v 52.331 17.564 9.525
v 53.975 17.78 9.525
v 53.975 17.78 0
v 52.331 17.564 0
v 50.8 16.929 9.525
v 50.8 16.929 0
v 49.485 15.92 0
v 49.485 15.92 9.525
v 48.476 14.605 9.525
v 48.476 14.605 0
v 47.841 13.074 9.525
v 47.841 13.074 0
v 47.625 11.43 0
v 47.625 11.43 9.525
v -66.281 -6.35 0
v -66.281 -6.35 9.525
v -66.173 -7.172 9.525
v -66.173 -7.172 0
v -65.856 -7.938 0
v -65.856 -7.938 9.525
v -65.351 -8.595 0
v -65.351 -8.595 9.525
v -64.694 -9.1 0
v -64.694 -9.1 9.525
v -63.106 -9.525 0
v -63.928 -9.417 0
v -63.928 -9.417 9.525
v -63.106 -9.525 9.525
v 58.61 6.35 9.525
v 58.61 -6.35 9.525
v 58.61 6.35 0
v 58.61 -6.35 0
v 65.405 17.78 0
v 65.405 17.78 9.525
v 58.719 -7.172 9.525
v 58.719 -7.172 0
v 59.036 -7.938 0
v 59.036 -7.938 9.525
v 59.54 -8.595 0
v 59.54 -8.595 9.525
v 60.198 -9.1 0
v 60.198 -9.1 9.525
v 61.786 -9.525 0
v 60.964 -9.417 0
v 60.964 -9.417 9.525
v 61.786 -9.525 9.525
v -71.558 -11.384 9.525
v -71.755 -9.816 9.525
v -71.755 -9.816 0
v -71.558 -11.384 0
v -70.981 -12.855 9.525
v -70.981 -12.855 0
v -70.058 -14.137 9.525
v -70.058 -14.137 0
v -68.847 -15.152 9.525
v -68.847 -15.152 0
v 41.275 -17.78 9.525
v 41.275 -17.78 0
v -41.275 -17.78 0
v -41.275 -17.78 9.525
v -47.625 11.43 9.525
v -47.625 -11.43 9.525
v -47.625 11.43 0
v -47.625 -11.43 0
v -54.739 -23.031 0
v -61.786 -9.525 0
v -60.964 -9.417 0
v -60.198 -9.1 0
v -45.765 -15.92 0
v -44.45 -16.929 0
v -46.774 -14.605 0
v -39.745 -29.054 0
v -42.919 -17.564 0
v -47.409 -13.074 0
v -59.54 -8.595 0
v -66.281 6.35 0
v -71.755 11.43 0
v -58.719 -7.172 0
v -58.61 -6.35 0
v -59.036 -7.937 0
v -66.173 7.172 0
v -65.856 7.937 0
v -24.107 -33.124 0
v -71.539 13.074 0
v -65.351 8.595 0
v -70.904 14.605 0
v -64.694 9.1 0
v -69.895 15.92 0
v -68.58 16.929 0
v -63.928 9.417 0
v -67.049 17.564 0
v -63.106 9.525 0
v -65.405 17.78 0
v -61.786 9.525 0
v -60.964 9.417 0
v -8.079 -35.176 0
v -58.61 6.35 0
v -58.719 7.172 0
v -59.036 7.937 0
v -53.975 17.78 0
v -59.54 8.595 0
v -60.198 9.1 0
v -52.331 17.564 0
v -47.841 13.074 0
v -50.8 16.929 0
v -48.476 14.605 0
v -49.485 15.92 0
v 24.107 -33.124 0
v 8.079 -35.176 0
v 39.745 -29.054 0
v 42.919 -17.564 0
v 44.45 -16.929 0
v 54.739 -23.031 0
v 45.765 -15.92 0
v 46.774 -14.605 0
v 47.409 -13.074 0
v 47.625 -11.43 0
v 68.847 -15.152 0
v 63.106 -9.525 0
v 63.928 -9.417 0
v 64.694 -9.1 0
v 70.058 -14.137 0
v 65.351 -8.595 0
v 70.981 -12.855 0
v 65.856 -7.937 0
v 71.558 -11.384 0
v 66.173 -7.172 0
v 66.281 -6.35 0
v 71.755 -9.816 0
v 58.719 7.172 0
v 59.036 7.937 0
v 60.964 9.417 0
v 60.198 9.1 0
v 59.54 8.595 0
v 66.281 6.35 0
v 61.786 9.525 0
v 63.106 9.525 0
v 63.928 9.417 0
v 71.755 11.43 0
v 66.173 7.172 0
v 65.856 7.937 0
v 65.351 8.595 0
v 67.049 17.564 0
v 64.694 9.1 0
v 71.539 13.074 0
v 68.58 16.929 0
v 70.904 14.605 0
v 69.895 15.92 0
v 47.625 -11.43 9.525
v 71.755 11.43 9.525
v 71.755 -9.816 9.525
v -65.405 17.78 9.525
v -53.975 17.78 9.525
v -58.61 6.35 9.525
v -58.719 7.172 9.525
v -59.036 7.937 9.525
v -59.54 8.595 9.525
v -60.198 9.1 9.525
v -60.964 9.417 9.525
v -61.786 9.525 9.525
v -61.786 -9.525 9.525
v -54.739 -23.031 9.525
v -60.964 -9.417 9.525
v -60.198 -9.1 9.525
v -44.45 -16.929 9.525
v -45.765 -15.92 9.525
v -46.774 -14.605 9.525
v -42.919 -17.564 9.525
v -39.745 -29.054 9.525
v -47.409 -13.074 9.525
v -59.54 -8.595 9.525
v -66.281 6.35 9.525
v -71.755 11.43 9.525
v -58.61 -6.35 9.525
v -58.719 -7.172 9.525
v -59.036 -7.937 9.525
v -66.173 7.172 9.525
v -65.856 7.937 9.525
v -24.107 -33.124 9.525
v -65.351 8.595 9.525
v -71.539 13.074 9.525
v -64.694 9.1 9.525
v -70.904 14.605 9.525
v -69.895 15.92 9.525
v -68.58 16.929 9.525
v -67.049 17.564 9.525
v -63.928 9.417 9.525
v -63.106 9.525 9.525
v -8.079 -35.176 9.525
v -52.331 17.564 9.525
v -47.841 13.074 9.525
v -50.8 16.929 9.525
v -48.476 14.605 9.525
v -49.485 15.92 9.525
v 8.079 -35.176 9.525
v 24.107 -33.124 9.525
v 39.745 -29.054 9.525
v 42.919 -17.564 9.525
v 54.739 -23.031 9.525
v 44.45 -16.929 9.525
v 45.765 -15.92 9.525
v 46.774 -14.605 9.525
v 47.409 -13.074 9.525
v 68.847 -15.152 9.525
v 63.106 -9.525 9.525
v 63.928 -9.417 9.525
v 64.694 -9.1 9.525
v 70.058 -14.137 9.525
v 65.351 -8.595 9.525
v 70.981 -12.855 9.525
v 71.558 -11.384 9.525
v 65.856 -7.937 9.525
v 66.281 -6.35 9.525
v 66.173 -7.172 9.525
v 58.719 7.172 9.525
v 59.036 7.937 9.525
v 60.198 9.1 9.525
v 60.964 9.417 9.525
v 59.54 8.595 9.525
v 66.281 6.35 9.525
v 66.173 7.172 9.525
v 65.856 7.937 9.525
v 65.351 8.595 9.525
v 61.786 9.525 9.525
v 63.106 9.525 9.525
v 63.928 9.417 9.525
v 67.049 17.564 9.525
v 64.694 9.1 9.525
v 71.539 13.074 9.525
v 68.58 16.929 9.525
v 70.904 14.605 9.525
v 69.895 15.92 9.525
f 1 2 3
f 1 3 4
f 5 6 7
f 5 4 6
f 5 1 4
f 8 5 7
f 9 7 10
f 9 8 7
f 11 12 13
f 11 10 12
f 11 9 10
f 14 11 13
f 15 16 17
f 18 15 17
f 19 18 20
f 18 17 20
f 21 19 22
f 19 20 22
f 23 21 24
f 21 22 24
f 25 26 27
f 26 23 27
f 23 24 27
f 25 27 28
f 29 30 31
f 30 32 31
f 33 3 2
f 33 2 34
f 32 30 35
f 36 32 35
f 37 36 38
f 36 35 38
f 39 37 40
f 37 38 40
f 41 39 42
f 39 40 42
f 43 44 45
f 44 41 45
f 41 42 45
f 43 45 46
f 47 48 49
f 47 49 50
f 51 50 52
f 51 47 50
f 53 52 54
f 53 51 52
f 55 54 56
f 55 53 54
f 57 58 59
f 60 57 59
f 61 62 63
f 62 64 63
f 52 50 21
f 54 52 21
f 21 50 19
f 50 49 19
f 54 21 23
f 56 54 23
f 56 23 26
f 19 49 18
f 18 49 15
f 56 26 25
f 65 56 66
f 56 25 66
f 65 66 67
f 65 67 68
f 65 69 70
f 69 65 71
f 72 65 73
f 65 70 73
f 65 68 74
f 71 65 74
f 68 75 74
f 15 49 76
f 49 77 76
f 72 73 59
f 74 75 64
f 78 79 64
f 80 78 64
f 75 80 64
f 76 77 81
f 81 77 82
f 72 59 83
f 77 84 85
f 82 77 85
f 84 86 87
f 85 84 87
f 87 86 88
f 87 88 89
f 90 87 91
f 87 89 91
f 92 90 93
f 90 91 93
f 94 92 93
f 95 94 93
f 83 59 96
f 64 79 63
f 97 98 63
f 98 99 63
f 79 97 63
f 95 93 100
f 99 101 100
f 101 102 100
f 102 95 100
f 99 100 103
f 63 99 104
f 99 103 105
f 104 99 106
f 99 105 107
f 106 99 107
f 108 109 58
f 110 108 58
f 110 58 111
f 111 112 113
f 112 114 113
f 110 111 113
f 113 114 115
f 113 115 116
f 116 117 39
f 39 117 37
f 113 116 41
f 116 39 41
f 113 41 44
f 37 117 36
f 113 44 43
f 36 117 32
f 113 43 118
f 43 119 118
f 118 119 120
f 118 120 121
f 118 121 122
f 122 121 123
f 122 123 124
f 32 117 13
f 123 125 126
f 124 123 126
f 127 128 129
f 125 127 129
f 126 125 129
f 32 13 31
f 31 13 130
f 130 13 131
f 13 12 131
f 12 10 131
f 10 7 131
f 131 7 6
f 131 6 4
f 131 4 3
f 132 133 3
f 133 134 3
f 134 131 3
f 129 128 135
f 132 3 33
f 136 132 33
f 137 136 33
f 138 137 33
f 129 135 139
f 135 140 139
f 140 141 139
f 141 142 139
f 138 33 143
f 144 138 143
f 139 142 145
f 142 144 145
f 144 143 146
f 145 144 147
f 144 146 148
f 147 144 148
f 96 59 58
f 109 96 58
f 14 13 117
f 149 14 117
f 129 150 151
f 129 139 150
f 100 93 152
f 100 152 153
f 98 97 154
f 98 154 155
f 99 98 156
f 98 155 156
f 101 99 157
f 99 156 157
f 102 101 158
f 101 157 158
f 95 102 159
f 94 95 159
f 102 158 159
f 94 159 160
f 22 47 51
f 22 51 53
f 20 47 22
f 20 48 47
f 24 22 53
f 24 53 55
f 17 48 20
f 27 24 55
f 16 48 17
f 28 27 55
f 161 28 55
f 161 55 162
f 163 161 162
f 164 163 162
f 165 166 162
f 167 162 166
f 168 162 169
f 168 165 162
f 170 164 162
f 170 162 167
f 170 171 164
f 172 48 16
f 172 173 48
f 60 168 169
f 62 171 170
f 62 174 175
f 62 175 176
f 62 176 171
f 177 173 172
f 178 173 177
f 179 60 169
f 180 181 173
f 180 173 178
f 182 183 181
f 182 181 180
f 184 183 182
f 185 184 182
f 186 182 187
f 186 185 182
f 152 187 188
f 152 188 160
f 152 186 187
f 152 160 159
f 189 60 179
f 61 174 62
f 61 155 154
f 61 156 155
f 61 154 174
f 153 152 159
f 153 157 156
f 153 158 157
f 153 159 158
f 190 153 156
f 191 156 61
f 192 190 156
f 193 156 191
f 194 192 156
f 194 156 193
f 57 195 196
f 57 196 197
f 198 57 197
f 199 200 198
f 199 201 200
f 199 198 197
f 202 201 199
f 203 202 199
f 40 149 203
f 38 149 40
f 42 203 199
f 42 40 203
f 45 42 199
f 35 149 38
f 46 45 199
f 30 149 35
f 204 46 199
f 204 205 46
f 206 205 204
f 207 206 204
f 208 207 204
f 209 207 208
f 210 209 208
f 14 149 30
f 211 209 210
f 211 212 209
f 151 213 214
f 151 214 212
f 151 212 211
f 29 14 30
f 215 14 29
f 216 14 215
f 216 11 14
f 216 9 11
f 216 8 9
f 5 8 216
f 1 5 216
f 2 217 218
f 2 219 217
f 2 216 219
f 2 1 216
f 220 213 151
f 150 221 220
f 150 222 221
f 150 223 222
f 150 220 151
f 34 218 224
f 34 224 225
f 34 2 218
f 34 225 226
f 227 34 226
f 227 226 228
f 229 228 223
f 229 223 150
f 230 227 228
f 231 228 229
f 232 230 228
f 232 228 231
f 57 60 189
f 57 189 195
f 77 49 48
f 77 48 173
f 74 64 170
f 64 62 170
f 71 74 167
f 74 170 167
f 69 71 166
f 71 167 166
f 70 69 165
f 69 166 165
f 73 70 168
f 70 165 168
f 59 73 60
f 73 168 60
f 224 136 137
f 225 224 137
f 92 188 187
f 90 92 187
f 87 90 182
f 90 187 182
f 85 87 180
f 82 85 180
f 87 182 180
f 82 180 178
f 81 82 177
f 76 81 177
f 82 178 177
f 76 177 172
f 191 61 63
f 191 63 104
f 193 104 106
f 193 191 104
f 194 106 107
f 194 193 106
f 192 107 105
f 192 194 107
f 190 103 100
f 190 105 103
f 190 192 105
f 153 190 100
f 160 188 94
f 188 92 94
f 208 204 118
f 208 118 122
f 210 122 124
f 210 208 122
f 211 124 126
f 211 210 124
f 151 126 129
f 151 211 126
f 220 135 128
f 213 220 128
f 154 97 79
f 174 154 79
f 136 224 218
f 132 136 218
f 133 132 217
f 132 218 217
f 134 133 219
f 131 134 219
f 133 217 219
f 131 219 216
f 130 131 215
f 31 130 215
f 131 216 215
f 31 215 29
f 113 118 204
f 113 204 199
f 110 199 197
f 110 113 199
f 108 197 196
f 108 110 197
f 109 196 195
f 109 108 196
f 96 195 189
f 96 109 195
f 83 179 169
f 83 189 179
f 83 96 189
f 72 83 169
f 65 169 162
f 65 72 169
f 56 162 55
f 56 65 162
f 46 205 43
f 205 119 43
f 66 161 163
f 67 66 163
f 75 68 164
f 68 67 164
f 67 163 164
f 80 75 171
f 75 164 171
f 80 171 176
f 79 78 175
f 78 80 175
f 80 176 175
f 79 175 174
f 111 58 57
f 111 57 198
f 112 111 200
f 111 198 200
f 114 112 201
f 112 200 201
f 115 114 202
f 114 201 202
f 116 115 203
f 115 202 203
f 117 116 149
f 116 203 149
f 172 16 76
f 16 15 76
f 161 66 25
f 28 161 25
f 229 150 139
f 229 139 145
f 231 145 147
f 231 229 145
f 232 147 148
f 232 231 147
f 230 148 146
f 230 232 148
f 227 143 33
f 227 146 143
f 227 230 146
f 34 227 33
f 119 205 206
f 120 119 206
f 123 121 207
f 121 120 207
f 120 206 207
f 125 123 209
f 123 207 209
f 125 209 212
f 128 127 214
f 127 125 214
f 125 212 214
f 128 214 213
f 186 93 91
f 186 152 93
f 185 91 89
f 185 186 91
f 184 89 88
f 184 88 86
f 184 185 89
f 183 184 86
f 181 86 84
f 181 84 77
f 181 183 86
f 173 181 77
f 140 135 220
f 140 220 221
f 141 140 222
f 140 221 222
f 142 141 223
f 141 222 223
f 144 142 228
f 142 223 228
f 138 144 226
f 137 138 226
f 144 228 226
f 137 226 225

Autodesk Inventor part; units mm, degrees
sketch "Sketch1" plane through (0, 0, 0) normal (0, 0, 1) x (1, 0, 0)
  line L0 (-100.457, 0) -> (100.457, 0) construction
  line L1 (0, 116.967) -> (0, -60.833) construction
  circle A0 centre (-62.4459, 0) radius 3.8354 construction
  circle A1 centre (62.4459, 0) radius 3.8354 construction
  line L2 (-62.4459, 0) -> (62.4459, 0) construction
  line L3 (-71.755, 17.78) -> (71.755, 17.78)
  line L4 (71.755, 17.78) -> (71.755, -13.2195)
  line L5 (-71.755, -13.2195) -> (-71.755, 17.78)
  circle A2 centre (-64.3509, 0) radius 3.8354 construction
  circle A3 centre (-60.5409, 0) radius 3.8354 construction
  line L6 (-64.3559, 3.8354) -> (-60.5409, 3.8354) construction
  line L7 (-64.3763, -3.8353) -> (-60.541, -3.8354) construction
  circle A4 centre (62.4459, 0) radius 3.8354 construction
  arc A5 (-71.755, -13.2195) -> (71.755, -13.2195) centre (0, 91.567) ccw
  line L8 (66.2813, -9.525) -> (58.6105, -9.525)
  line L9 (58.6105, -9.525) -> (58.6105, 9.525)
  line L10 (58.6105, 9.525) -> (66.2813, 9.525)
  line L11 (66.2813, 9.525) -> (66.2813, -9.525)
  line L12 (66.2813, -9.525) -> (58.6105, 9.525) construction
  line L13 (58.6105, -9.525) -> (66.2813, 9.525) construction
  line L14 (-58.6105, -9.525) -> (-66.2813, -9.525)
  line L15 (-66.2813, -9.525) -> (-66.2813, 9.525)
  line L16 (-66.2813, 9.525) -> (-58.6105, 9.525)
  line L17 (-58.6105, 9.525) -> (-58.6105, -9.525)
  line L18 (-58.6105, -9.525) -> (-66.2813, 9.525) construction
  line L19 (-66.2813, -9.525) -> (-58.6105, 9.525) construction
  point P0 (0, 0)
  point P1 (0, 0)
  point P2 (0, 17.78)
  dimension "d0" = 7.6708
  dimension "d1" = 124.8918
  dimension "d2" = 143.51
  dimension "d3" = 17.78
  dimension "d16" = 7.6708
  dimension "d17" = 1.905
  dimension "d18" = 1.905
  dimension "d33" = 127
  dimension "d34" = 19.05
  dimension "d35" = 19.05
  dimension "d36" = 7.6708
  dimension "d37" = 35.433
ref_plane "Work Plane1" through (0, -74.9046, 0) normal (0, 1, 0) x (-1, 0, 0)
ref_plane "Work Plane2" through (0, -1.905, 0) normal (0, 1, 0) x (-1, 0, 0)
extrude "Extrusion1" add sketch "Sketch1" along normal blind 9.525 contours L3 L4 A5 L5 | L8 L9 L10 L11 | L14 L15 L16 L17
extrude "Extrusion3" cut sketch "Sketch1" along normal blind 9.525 contours L8 L9 L10 L11 | L14 L15 L16 L17
sketch "Sketch4" plane through (0, 0, 0) normal (0, 0, 1) x (1, 0, 0)
  line L0 (-71.755, 17.78) -> (71.755, 17.78) projected
  line L1 (-47.625, 17.78) -> (47.625, 17.78)
  line L2 (47.625, 17.78) -> (47.625, -17.78)
  line L3 (47.625, -17.78) -> (-47.625, -17.78)
  line L4 (-47.625, -17.78) -> (-47.625, 17.78)
  line L5 (0, -17.78) -> (0, 17.78) construction
  point P0 (0, 0)
  dimension "d21" = 35.56
  dimension "d22" = 95.25
  dimension "d23" = 0
extrude "Extrusion4" cut sketch "Sketch4" along normal up to next
fillet "Fillet2" radius 6.35 8 edges at (-47.625, -17.78, 4.7625) (-47.625, 17.78, 4.7625) (-71.755, 17.78, 4.7625) (47.625, -17.78, 4.7625) (47.625, 17.78, 4.7625) (71.755, 17.78, 4.7625) (71.755, -13.2195, 4.7625) (-71.755, -13.2195, 4.7625)
fillet "Fillet4" radius 3.175 8 edges at (-66.2813, 9.525, 4.7625) (-58.6105, 9.525, 4.7625) (-58.6105, -9.525, 4.7625) (-66.2813, -9.525, 4.7625) (58.6105, 9.525, 4.7625) (66.2813, 9.525, 4.7625) (66.2813, -9.525, 4.7625) (58.6105, -9.525, 4.7625)
sketch "Sketch5" plane through (0, 0, 0) normal (0, 0, 1) x (1, 0, 0)
  line L0 (-100.457, -1.905) -> (100.457, -1.905) projected
  line L1 (-62.4459, 0) -> (-62.4459, -1.905)
  line L2 (62.4459, 0) -> (62.4459, -1.905)
  point P0 (0, 0)
properties part number "J005684"
